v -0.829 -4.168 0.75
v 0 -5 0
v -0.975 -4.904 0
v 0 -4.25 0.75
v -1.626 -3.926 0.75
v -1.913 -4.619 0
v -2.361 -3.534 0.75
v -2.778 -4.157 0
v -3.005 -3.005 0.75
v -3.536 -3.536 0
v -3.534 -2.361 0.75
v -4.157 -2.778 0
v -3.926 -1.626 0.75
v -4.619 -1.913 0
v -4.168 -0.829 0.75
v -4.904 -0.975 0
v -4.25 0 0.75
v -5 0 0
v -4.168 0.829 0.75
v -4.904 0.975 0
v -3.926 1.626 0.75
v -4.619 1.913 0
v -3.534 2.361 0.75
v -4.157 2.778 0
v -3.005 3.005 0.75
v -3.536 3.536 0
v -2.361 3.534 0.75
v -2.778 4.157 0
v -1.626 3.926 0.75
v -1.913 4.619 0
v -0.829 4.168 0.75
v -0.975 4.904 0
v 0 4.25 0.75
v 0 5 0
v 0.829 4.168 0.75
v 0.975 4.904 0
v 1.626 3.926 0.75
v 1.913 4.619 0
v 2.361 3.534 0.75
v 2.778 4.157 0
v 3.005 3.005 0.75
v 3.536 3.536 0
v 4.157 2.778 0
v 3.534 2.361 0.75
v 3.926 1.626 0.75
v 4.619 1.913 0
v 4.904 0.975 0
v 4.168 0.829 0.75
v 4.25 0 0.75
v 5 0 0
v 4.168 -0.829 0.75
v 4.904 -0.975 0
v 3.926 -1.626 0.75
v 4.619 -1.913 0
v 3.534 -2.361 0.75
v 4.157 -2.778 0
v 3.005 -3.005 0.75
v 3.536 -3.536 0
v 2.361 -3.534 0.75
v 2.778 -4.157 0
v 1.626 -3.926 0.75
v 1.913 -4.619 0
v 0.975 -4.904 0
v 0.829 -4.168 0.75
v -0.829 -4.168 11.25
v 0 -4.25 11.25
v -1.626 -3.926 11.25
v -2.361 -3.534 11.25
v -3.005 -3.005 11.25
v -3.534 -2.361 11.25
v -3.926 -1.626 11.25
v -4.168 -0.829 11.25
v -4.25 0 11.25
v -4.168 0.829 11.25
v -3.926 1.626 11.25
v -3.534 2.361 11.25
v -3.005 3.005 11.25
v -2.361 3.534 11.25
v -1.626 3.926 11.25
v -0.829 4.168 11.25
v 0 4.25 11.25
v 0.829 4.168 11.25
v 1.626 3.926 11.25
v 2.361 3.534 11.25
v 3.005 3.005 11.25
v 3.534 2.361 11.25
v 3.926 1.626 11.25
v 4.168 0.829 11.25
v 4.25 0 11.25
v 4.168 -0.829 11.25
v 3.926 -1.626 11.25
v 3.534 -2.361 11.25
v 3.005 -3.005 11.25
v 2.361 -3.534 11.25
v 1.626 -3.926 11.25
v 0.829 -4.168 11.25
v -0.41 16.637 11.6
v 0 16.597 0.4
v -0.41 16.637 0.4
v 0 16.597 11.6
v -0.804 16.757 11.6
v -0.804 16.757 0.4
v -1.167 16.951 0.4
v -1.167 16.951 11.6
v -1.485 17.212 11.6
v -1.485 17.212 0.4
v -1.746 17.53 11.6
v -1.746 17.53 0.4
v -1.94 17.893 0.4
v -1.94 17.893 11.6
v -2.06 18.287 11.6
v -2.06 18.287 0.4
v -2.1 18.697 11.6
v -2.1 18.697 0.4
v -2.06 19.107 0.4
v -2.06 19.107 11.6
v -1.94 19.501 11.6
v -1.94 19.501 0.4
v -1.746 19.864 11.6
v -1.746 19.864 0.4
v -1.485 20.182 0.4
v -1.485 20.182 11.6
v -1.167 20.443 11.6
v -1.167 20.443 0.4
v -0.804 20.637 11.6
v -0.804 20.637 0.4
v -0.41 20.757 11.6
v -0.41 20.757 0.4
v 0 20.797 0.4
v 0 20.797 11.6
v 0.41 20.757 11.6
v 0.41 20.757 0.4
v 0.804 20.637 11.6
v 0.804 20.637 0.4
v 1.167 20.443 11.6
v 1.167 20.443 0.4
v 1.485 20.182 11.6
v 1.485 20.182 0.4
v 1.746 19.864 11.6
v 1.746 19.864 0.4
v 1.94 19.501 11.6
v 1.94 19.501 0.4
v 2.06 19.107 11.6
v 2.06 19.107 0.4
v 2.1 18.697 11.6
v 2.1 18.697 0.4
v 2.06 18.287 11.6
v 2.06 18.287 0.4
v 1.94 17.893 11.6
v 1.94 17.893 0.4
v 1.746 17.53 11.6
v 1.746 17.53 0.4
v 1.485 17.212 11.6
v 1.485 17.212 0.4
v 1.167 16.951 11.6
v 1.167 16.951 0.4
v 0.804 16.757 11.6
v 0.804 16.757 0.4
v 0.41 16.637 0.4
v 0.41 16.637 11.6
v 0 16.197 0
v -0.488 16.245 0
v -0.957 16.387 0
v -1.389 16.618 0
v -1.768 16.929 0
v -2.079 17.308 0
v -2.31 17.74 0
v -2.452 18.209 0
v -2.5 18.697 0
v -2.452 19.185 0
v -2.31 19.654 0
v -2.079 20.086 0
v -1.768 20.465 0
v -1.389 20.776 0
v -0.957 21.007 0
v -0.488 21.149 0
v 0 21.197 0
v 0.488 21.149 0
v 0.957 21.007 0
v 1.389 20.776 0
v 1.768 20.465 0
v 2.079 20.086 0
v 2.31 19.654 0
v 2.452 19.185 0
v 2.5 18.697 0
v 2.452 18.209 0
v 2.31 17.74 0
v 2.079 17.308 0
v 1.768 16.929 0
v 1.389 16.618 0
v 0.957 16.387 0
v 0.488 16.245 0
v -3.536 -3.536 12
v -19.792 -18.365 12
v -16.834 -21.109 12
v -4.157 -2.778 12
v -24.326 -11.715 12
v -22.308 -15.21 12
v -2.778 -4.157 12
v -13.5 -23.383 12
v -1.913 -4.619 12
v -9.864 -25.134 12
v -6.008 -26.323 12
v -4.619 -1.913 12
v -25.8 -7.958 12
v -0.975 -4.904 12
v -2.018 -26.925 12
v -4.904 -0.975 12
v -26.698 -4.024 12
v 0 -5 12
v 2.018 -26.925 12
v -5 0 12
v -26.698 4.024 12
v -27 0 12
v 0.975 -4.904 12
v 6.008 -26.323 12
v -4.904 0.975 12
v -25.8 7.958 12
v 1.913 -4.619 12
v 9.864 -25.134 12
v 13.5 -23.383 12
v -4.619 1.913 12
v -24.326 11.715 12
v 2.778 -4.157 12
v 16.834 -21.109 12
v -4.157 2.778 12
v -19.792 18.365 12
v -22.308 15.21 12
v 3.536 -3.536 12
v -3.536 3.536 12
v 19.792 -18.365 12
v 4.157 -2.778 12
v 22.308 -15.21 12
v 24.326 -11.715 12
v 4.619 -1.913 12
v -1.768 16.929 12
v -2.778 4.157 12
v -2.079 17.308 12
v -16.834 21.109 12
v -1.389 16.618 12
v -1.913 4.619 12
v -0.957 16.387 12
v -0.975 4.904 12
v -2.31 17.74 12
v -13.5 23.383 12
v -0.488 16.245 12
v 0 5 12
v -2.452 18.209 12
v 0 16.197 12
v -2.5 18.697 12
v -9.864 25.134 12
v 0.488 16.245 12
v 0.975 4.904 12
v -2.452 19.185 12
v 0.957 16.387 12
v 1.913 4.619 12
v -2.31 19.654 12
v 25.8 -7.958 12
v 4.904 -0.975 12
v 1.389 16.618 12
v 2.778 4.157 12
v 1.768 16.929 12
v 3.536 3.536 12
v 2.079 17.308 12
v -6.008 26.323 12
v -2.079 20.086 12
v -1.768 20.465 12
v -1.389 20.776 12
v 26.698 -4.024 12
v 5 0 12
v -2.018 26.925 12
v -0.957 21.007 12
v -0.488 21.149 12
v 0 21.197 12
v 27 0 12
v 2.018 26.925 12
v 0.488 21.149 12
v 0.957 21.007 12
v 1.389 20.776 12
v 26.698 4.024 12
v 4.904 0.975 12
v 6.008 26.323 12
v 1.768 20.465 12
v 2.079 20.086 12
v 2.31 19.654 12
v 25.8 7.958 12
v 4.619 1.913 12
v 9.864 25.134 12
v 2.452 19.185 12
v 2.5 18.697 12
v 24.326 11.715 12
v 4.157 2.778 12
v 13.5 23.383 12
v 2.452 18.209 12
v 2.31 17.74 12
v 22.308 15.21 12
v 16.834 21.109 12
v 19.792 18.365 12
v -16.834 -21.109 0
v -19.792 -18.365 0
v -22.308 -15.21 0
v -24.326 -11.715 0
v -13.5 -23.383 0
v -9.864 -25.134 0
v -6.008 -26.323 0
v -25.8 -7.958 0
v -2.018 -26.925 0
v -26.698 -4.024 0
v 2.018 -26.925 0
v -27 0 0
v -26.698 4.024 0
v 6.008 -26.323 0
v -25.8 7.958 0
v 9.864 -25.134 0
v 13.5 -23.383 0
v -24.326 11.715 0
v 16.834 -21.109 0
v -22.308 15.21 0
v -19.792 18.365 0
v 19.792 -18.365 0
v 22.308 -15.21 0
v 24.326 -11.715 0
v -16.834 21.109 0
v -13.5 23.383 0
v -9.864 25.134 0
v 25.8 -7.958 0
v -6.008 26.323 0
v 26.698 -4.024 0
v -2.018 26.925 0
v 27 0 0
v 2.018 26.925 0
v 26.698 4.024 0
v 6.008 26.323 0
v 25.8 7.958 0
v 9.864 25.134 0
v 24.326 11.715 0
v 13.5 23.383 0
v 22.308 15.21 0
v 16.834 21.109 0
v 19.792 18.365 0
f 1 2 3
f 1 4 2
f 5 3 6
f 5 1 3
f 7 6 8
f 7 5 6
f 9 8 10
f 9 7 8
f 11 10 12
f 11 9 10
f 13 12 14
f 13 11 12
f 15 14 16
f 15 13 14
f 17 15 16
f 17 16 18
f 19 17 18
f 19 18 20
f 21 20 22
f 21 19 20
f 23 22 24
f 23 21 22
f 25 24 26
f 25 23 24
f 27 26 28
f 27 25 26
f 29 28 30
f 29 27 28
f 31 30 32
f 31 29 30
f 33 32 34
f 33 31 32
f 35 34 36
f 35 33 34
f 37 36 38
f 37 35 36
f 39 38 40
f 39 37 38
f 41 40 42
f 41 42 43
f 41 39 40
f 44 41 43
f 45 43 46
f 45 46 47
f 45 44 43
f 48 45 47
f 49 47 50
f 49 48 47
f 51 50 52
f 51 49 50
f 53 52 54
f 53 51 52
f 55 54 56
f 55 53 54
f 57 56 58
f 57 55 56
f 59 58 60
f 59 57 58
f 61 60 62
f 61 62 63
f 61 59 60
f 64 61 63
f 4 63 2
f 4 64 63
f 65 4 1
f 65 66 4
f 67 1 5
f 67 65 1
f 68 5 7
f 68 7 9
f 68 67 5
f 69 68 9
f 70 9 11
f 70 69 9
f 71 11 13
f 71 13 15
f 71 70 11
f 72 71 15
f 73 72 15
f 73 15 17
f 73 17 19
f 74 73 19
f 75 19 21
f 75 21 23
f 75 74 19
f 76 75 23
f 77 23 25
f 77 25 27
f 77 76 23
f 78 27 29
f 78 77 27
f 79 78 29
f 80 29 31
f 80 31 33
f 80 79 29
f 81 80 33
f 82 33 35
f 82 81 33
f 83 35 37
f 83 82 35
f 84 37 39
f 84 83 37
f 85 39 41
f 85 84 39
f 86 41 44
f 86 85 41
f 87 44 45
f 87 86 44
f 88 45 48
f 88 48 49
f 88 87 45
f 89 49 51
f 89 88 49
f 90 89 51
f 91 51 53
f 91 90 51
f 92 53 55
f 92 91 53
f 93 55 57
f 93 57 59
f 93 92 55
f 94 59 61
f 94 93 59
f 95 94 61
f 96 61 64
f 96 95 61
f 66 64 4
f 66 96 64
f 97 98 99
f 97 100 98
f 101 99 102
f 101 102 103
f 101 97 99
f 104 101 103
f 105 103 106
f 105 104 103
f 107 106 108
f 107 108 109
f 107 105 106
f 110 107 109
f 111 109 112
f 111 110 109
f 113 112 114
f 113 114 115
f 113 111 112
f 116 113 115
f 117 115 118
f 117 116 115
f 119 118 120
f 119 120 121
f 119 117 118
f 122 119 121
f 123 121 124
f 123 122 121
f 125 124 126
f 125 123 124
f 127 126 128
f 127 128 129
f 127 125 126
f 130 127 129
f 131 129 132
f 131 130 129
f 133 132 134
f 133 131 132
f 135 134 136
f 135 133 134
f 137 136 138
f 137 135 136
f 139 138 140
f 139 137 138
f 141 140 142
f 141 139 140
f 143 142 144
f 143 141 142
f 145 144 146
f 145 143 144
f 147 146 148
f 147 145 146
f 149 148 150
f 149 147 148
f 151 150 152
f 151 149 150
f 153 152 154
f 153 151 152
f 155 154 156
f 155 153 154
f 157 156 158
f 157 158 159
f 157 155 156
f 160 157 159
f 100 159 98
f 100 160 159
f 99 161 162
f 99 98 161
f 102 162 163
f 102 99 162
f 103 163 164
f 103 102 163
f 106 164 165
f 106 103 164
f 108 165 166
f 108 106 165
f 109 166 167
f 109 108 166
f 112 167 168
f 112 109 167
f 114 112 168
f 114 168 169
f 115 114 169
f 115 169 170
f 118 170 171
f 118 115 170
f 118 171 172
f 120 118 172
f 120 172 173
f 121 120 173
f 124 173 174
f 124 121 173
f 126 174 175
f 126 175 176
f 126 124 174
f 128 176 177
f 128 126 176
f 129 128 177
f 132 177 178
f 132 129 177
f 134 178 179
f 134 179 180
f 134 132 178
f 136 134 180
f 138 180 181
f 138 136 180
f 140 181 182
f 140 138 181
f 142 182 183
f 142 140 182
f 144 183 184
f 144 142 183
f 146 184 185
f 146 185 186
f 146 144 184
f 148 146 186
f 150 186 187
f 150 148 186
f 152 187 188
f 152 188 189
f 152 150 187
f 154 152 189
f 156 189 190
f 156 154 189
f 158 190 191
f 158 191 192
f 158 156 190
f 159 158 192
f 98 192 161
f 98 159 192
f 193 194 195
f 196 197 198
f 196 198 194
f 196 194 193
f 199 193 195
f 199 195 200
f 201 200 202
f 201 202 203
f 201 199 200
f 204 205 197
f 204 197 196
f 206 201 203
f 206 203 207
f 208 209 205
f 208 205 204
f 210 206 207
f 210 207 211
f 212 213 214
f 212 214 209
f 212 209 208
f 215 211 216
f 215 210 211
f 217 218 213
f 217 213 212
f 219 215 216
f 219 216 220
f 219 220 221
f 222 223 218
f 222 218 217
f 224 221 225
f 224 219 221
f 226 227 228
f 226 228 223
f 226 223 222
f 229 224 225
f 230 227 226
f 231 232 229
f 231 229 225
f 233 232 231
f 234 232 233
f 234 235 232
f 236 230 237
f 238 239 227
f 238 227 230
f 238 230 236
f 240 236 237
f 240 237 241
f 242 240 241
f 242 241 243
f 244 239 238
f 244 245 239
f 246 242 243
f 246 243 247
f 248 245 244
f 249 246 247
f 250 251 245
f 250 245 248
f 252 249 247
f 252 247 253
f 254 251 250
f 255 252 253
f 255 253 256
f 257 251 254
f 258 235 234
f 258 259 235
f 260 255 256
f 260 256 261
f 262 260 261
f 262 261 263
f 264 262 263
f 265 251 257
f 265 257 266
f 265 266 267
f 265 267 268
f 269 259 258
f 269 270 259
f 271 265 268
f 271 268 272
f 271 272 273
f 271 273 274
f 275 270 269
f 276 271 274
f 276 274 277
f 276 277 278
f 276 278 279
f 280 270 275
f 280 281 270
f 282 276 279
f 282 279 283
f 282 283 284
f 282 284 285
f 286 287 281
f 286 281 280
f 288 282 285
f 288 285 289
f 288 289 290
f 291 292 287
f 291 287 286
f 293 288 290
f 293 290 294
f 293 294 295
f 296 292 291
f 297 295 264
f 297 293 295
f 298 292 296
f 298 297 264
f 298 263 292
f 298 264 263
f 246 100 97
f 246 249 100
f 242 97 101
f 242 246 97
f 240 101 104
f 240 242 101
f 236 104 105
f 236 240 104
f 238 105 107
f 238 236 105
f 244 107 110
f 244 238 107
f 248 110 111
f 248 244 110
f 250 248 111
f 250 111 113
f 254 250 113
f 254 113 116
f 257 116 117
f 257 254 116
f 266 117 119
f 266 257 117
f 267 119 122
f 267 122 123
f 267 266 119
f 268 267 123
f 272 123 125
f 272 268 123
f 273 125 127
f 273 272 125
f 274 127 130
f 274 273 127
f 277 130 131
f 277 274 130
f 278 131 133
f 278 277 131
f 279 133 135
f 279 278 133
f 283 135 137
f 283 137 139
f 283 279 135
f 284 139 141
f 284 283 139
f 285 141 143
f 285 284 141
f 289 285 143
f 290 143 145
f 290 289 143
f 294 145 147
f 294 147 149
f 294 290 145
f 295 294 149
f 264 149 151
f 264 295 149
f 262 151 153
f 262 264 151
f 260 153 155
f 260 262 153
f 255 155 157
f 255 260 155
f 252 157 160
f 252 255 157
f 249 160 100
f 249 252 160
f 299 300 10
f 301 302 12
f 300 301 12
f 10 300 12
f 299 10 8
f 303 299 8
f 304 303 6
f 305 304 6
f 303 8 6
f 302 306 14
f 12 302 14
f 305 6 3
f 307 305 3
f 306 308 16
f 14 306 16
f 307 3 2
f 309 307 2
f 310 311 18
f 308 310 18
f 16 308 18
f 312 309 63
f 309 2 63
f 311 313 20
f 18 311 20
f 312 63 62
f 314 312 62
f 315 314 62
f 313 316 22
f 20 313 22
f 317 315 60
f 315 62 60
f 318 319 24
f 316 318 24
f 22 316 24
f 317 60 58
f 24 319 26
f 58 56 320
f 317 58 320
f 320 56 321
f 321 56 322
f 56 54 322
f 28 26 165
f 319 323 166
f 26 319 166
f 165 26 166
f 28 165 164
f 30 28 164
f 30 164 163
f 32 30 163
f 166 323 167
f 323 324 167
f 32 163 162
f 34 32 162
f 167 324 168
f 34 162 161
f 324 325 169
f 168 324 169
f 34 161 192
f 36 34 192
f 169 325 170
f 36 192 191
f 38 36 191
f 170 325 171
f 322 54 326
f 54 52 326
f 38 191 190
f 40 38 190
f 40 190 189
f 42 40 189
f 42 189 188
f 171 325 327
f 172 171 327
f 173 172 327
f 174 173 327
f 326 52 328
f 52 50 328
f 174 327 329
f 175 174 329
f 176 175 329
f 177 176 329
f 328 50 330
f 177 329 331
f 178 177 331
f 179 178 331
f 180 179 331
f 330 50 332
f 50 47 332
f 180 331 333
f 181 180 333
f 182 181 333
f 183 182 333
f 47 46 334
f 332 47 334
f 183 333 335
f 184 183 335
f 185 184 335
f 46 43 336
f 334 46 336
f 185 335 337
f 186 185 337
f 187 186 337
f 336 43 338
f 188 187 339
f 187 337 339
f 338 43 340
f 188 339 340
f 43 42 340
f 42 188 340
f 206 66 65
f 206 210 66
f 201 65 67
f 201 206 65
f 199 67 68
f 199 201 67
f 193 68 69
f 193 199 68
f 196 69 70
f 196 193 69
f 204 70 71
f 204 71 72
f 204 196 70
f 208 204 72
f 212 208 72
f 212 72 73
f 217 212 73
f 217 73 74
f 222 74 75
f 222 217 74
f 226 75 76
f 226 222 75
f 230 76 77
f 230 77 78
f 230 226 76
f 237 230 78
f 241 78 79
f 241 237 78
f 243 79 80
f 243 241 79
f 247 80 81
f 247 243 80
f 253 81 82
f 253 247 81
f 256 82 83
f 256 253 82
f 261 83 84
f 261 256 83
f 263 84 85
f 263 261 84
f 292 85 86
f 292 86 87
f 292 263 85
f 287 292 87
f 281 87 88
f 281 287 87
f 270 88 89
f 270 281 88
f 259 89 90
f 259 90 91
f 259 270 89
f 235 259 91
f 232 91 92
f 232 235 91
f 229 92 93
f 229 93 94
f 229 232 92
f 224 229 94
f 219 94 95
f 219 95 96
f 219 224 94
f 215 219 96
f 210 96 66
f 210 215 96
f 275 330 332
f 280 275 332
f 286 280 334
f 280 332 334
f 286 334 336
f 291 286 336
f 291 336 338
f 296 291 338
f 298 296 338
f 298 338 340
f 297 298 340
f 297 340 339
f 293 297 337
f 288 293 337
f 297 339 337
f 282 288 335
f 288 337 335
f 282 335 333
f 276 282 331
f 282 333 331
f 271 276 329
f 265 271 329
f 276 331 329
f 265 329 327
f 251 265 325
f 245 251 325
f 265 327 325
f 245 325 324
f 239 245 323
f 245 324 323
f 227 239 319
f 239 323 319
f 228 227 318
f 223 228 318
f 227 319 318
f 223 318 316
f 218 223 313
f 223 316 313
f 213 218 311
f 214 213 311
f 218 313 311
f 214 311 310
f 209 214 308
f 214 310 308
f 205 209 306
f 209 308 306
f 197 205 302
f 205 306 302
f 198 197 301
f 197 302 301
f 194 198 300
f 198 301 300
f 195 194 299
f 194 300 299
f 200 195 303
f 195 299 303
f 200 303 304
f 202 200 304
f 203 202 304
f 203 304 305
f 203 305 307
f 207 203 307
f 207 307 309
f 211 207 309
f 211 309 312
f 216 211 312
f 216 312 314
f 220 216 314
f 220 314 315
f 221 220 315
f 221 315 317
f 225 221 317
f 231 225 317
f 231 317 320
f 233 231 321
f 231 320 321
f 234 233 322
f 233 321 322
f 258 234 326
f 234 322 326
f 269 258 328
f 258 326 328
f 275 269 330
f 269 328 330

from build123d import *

# Parameters (mm, degrees)
SKETCH1_R           = 27
BOSS_EXTRUDE1_DEPTH = 12


with BuildPart() as part:
    # Sketch1 → Boss-Extrude1 (new body)
    with BuildSketch(Plane.XY):
        Circle(SKETCH1_R)
    extrude(amount=BOSS_EXTRUDE1_DEPTH)

    # Sketch8 → M10 Tapped Hole2 (revolve, cut)
    with BuildSketch(Plane(origin=(0, 0, 12), x_dir=(0, -1, 0), z_dir=(1, 0, 0))):
        Polygon((0, 0), (0, 12), (5, 12), (4.25, 11.25), (4.25, 0.75), (5, 0), align=None)
    revolve(axis=Axis((0, 0, 18.35), (0, 0, -1)), mode=Mode.SUBTRACT)

    # Sketch9 → M5 Tapped Hole1 (revolve, cut)
    with BuildSketch(Plane(origin=(0, 18.69698963, 12), x_dir=(0, -1, 0), z_dir=(1, 0, 0))):
        Polygon((0, 0), (0, 12), (2.5, 12), (2.1, 11.6), (2.1, 0.4), (2.5, 0), align=None)
    revolve(axis=Axis((0, 18.69698963, 18.35), (0, 0, -1)), mode=Mode.SUBTRACT)


solid = part.part
